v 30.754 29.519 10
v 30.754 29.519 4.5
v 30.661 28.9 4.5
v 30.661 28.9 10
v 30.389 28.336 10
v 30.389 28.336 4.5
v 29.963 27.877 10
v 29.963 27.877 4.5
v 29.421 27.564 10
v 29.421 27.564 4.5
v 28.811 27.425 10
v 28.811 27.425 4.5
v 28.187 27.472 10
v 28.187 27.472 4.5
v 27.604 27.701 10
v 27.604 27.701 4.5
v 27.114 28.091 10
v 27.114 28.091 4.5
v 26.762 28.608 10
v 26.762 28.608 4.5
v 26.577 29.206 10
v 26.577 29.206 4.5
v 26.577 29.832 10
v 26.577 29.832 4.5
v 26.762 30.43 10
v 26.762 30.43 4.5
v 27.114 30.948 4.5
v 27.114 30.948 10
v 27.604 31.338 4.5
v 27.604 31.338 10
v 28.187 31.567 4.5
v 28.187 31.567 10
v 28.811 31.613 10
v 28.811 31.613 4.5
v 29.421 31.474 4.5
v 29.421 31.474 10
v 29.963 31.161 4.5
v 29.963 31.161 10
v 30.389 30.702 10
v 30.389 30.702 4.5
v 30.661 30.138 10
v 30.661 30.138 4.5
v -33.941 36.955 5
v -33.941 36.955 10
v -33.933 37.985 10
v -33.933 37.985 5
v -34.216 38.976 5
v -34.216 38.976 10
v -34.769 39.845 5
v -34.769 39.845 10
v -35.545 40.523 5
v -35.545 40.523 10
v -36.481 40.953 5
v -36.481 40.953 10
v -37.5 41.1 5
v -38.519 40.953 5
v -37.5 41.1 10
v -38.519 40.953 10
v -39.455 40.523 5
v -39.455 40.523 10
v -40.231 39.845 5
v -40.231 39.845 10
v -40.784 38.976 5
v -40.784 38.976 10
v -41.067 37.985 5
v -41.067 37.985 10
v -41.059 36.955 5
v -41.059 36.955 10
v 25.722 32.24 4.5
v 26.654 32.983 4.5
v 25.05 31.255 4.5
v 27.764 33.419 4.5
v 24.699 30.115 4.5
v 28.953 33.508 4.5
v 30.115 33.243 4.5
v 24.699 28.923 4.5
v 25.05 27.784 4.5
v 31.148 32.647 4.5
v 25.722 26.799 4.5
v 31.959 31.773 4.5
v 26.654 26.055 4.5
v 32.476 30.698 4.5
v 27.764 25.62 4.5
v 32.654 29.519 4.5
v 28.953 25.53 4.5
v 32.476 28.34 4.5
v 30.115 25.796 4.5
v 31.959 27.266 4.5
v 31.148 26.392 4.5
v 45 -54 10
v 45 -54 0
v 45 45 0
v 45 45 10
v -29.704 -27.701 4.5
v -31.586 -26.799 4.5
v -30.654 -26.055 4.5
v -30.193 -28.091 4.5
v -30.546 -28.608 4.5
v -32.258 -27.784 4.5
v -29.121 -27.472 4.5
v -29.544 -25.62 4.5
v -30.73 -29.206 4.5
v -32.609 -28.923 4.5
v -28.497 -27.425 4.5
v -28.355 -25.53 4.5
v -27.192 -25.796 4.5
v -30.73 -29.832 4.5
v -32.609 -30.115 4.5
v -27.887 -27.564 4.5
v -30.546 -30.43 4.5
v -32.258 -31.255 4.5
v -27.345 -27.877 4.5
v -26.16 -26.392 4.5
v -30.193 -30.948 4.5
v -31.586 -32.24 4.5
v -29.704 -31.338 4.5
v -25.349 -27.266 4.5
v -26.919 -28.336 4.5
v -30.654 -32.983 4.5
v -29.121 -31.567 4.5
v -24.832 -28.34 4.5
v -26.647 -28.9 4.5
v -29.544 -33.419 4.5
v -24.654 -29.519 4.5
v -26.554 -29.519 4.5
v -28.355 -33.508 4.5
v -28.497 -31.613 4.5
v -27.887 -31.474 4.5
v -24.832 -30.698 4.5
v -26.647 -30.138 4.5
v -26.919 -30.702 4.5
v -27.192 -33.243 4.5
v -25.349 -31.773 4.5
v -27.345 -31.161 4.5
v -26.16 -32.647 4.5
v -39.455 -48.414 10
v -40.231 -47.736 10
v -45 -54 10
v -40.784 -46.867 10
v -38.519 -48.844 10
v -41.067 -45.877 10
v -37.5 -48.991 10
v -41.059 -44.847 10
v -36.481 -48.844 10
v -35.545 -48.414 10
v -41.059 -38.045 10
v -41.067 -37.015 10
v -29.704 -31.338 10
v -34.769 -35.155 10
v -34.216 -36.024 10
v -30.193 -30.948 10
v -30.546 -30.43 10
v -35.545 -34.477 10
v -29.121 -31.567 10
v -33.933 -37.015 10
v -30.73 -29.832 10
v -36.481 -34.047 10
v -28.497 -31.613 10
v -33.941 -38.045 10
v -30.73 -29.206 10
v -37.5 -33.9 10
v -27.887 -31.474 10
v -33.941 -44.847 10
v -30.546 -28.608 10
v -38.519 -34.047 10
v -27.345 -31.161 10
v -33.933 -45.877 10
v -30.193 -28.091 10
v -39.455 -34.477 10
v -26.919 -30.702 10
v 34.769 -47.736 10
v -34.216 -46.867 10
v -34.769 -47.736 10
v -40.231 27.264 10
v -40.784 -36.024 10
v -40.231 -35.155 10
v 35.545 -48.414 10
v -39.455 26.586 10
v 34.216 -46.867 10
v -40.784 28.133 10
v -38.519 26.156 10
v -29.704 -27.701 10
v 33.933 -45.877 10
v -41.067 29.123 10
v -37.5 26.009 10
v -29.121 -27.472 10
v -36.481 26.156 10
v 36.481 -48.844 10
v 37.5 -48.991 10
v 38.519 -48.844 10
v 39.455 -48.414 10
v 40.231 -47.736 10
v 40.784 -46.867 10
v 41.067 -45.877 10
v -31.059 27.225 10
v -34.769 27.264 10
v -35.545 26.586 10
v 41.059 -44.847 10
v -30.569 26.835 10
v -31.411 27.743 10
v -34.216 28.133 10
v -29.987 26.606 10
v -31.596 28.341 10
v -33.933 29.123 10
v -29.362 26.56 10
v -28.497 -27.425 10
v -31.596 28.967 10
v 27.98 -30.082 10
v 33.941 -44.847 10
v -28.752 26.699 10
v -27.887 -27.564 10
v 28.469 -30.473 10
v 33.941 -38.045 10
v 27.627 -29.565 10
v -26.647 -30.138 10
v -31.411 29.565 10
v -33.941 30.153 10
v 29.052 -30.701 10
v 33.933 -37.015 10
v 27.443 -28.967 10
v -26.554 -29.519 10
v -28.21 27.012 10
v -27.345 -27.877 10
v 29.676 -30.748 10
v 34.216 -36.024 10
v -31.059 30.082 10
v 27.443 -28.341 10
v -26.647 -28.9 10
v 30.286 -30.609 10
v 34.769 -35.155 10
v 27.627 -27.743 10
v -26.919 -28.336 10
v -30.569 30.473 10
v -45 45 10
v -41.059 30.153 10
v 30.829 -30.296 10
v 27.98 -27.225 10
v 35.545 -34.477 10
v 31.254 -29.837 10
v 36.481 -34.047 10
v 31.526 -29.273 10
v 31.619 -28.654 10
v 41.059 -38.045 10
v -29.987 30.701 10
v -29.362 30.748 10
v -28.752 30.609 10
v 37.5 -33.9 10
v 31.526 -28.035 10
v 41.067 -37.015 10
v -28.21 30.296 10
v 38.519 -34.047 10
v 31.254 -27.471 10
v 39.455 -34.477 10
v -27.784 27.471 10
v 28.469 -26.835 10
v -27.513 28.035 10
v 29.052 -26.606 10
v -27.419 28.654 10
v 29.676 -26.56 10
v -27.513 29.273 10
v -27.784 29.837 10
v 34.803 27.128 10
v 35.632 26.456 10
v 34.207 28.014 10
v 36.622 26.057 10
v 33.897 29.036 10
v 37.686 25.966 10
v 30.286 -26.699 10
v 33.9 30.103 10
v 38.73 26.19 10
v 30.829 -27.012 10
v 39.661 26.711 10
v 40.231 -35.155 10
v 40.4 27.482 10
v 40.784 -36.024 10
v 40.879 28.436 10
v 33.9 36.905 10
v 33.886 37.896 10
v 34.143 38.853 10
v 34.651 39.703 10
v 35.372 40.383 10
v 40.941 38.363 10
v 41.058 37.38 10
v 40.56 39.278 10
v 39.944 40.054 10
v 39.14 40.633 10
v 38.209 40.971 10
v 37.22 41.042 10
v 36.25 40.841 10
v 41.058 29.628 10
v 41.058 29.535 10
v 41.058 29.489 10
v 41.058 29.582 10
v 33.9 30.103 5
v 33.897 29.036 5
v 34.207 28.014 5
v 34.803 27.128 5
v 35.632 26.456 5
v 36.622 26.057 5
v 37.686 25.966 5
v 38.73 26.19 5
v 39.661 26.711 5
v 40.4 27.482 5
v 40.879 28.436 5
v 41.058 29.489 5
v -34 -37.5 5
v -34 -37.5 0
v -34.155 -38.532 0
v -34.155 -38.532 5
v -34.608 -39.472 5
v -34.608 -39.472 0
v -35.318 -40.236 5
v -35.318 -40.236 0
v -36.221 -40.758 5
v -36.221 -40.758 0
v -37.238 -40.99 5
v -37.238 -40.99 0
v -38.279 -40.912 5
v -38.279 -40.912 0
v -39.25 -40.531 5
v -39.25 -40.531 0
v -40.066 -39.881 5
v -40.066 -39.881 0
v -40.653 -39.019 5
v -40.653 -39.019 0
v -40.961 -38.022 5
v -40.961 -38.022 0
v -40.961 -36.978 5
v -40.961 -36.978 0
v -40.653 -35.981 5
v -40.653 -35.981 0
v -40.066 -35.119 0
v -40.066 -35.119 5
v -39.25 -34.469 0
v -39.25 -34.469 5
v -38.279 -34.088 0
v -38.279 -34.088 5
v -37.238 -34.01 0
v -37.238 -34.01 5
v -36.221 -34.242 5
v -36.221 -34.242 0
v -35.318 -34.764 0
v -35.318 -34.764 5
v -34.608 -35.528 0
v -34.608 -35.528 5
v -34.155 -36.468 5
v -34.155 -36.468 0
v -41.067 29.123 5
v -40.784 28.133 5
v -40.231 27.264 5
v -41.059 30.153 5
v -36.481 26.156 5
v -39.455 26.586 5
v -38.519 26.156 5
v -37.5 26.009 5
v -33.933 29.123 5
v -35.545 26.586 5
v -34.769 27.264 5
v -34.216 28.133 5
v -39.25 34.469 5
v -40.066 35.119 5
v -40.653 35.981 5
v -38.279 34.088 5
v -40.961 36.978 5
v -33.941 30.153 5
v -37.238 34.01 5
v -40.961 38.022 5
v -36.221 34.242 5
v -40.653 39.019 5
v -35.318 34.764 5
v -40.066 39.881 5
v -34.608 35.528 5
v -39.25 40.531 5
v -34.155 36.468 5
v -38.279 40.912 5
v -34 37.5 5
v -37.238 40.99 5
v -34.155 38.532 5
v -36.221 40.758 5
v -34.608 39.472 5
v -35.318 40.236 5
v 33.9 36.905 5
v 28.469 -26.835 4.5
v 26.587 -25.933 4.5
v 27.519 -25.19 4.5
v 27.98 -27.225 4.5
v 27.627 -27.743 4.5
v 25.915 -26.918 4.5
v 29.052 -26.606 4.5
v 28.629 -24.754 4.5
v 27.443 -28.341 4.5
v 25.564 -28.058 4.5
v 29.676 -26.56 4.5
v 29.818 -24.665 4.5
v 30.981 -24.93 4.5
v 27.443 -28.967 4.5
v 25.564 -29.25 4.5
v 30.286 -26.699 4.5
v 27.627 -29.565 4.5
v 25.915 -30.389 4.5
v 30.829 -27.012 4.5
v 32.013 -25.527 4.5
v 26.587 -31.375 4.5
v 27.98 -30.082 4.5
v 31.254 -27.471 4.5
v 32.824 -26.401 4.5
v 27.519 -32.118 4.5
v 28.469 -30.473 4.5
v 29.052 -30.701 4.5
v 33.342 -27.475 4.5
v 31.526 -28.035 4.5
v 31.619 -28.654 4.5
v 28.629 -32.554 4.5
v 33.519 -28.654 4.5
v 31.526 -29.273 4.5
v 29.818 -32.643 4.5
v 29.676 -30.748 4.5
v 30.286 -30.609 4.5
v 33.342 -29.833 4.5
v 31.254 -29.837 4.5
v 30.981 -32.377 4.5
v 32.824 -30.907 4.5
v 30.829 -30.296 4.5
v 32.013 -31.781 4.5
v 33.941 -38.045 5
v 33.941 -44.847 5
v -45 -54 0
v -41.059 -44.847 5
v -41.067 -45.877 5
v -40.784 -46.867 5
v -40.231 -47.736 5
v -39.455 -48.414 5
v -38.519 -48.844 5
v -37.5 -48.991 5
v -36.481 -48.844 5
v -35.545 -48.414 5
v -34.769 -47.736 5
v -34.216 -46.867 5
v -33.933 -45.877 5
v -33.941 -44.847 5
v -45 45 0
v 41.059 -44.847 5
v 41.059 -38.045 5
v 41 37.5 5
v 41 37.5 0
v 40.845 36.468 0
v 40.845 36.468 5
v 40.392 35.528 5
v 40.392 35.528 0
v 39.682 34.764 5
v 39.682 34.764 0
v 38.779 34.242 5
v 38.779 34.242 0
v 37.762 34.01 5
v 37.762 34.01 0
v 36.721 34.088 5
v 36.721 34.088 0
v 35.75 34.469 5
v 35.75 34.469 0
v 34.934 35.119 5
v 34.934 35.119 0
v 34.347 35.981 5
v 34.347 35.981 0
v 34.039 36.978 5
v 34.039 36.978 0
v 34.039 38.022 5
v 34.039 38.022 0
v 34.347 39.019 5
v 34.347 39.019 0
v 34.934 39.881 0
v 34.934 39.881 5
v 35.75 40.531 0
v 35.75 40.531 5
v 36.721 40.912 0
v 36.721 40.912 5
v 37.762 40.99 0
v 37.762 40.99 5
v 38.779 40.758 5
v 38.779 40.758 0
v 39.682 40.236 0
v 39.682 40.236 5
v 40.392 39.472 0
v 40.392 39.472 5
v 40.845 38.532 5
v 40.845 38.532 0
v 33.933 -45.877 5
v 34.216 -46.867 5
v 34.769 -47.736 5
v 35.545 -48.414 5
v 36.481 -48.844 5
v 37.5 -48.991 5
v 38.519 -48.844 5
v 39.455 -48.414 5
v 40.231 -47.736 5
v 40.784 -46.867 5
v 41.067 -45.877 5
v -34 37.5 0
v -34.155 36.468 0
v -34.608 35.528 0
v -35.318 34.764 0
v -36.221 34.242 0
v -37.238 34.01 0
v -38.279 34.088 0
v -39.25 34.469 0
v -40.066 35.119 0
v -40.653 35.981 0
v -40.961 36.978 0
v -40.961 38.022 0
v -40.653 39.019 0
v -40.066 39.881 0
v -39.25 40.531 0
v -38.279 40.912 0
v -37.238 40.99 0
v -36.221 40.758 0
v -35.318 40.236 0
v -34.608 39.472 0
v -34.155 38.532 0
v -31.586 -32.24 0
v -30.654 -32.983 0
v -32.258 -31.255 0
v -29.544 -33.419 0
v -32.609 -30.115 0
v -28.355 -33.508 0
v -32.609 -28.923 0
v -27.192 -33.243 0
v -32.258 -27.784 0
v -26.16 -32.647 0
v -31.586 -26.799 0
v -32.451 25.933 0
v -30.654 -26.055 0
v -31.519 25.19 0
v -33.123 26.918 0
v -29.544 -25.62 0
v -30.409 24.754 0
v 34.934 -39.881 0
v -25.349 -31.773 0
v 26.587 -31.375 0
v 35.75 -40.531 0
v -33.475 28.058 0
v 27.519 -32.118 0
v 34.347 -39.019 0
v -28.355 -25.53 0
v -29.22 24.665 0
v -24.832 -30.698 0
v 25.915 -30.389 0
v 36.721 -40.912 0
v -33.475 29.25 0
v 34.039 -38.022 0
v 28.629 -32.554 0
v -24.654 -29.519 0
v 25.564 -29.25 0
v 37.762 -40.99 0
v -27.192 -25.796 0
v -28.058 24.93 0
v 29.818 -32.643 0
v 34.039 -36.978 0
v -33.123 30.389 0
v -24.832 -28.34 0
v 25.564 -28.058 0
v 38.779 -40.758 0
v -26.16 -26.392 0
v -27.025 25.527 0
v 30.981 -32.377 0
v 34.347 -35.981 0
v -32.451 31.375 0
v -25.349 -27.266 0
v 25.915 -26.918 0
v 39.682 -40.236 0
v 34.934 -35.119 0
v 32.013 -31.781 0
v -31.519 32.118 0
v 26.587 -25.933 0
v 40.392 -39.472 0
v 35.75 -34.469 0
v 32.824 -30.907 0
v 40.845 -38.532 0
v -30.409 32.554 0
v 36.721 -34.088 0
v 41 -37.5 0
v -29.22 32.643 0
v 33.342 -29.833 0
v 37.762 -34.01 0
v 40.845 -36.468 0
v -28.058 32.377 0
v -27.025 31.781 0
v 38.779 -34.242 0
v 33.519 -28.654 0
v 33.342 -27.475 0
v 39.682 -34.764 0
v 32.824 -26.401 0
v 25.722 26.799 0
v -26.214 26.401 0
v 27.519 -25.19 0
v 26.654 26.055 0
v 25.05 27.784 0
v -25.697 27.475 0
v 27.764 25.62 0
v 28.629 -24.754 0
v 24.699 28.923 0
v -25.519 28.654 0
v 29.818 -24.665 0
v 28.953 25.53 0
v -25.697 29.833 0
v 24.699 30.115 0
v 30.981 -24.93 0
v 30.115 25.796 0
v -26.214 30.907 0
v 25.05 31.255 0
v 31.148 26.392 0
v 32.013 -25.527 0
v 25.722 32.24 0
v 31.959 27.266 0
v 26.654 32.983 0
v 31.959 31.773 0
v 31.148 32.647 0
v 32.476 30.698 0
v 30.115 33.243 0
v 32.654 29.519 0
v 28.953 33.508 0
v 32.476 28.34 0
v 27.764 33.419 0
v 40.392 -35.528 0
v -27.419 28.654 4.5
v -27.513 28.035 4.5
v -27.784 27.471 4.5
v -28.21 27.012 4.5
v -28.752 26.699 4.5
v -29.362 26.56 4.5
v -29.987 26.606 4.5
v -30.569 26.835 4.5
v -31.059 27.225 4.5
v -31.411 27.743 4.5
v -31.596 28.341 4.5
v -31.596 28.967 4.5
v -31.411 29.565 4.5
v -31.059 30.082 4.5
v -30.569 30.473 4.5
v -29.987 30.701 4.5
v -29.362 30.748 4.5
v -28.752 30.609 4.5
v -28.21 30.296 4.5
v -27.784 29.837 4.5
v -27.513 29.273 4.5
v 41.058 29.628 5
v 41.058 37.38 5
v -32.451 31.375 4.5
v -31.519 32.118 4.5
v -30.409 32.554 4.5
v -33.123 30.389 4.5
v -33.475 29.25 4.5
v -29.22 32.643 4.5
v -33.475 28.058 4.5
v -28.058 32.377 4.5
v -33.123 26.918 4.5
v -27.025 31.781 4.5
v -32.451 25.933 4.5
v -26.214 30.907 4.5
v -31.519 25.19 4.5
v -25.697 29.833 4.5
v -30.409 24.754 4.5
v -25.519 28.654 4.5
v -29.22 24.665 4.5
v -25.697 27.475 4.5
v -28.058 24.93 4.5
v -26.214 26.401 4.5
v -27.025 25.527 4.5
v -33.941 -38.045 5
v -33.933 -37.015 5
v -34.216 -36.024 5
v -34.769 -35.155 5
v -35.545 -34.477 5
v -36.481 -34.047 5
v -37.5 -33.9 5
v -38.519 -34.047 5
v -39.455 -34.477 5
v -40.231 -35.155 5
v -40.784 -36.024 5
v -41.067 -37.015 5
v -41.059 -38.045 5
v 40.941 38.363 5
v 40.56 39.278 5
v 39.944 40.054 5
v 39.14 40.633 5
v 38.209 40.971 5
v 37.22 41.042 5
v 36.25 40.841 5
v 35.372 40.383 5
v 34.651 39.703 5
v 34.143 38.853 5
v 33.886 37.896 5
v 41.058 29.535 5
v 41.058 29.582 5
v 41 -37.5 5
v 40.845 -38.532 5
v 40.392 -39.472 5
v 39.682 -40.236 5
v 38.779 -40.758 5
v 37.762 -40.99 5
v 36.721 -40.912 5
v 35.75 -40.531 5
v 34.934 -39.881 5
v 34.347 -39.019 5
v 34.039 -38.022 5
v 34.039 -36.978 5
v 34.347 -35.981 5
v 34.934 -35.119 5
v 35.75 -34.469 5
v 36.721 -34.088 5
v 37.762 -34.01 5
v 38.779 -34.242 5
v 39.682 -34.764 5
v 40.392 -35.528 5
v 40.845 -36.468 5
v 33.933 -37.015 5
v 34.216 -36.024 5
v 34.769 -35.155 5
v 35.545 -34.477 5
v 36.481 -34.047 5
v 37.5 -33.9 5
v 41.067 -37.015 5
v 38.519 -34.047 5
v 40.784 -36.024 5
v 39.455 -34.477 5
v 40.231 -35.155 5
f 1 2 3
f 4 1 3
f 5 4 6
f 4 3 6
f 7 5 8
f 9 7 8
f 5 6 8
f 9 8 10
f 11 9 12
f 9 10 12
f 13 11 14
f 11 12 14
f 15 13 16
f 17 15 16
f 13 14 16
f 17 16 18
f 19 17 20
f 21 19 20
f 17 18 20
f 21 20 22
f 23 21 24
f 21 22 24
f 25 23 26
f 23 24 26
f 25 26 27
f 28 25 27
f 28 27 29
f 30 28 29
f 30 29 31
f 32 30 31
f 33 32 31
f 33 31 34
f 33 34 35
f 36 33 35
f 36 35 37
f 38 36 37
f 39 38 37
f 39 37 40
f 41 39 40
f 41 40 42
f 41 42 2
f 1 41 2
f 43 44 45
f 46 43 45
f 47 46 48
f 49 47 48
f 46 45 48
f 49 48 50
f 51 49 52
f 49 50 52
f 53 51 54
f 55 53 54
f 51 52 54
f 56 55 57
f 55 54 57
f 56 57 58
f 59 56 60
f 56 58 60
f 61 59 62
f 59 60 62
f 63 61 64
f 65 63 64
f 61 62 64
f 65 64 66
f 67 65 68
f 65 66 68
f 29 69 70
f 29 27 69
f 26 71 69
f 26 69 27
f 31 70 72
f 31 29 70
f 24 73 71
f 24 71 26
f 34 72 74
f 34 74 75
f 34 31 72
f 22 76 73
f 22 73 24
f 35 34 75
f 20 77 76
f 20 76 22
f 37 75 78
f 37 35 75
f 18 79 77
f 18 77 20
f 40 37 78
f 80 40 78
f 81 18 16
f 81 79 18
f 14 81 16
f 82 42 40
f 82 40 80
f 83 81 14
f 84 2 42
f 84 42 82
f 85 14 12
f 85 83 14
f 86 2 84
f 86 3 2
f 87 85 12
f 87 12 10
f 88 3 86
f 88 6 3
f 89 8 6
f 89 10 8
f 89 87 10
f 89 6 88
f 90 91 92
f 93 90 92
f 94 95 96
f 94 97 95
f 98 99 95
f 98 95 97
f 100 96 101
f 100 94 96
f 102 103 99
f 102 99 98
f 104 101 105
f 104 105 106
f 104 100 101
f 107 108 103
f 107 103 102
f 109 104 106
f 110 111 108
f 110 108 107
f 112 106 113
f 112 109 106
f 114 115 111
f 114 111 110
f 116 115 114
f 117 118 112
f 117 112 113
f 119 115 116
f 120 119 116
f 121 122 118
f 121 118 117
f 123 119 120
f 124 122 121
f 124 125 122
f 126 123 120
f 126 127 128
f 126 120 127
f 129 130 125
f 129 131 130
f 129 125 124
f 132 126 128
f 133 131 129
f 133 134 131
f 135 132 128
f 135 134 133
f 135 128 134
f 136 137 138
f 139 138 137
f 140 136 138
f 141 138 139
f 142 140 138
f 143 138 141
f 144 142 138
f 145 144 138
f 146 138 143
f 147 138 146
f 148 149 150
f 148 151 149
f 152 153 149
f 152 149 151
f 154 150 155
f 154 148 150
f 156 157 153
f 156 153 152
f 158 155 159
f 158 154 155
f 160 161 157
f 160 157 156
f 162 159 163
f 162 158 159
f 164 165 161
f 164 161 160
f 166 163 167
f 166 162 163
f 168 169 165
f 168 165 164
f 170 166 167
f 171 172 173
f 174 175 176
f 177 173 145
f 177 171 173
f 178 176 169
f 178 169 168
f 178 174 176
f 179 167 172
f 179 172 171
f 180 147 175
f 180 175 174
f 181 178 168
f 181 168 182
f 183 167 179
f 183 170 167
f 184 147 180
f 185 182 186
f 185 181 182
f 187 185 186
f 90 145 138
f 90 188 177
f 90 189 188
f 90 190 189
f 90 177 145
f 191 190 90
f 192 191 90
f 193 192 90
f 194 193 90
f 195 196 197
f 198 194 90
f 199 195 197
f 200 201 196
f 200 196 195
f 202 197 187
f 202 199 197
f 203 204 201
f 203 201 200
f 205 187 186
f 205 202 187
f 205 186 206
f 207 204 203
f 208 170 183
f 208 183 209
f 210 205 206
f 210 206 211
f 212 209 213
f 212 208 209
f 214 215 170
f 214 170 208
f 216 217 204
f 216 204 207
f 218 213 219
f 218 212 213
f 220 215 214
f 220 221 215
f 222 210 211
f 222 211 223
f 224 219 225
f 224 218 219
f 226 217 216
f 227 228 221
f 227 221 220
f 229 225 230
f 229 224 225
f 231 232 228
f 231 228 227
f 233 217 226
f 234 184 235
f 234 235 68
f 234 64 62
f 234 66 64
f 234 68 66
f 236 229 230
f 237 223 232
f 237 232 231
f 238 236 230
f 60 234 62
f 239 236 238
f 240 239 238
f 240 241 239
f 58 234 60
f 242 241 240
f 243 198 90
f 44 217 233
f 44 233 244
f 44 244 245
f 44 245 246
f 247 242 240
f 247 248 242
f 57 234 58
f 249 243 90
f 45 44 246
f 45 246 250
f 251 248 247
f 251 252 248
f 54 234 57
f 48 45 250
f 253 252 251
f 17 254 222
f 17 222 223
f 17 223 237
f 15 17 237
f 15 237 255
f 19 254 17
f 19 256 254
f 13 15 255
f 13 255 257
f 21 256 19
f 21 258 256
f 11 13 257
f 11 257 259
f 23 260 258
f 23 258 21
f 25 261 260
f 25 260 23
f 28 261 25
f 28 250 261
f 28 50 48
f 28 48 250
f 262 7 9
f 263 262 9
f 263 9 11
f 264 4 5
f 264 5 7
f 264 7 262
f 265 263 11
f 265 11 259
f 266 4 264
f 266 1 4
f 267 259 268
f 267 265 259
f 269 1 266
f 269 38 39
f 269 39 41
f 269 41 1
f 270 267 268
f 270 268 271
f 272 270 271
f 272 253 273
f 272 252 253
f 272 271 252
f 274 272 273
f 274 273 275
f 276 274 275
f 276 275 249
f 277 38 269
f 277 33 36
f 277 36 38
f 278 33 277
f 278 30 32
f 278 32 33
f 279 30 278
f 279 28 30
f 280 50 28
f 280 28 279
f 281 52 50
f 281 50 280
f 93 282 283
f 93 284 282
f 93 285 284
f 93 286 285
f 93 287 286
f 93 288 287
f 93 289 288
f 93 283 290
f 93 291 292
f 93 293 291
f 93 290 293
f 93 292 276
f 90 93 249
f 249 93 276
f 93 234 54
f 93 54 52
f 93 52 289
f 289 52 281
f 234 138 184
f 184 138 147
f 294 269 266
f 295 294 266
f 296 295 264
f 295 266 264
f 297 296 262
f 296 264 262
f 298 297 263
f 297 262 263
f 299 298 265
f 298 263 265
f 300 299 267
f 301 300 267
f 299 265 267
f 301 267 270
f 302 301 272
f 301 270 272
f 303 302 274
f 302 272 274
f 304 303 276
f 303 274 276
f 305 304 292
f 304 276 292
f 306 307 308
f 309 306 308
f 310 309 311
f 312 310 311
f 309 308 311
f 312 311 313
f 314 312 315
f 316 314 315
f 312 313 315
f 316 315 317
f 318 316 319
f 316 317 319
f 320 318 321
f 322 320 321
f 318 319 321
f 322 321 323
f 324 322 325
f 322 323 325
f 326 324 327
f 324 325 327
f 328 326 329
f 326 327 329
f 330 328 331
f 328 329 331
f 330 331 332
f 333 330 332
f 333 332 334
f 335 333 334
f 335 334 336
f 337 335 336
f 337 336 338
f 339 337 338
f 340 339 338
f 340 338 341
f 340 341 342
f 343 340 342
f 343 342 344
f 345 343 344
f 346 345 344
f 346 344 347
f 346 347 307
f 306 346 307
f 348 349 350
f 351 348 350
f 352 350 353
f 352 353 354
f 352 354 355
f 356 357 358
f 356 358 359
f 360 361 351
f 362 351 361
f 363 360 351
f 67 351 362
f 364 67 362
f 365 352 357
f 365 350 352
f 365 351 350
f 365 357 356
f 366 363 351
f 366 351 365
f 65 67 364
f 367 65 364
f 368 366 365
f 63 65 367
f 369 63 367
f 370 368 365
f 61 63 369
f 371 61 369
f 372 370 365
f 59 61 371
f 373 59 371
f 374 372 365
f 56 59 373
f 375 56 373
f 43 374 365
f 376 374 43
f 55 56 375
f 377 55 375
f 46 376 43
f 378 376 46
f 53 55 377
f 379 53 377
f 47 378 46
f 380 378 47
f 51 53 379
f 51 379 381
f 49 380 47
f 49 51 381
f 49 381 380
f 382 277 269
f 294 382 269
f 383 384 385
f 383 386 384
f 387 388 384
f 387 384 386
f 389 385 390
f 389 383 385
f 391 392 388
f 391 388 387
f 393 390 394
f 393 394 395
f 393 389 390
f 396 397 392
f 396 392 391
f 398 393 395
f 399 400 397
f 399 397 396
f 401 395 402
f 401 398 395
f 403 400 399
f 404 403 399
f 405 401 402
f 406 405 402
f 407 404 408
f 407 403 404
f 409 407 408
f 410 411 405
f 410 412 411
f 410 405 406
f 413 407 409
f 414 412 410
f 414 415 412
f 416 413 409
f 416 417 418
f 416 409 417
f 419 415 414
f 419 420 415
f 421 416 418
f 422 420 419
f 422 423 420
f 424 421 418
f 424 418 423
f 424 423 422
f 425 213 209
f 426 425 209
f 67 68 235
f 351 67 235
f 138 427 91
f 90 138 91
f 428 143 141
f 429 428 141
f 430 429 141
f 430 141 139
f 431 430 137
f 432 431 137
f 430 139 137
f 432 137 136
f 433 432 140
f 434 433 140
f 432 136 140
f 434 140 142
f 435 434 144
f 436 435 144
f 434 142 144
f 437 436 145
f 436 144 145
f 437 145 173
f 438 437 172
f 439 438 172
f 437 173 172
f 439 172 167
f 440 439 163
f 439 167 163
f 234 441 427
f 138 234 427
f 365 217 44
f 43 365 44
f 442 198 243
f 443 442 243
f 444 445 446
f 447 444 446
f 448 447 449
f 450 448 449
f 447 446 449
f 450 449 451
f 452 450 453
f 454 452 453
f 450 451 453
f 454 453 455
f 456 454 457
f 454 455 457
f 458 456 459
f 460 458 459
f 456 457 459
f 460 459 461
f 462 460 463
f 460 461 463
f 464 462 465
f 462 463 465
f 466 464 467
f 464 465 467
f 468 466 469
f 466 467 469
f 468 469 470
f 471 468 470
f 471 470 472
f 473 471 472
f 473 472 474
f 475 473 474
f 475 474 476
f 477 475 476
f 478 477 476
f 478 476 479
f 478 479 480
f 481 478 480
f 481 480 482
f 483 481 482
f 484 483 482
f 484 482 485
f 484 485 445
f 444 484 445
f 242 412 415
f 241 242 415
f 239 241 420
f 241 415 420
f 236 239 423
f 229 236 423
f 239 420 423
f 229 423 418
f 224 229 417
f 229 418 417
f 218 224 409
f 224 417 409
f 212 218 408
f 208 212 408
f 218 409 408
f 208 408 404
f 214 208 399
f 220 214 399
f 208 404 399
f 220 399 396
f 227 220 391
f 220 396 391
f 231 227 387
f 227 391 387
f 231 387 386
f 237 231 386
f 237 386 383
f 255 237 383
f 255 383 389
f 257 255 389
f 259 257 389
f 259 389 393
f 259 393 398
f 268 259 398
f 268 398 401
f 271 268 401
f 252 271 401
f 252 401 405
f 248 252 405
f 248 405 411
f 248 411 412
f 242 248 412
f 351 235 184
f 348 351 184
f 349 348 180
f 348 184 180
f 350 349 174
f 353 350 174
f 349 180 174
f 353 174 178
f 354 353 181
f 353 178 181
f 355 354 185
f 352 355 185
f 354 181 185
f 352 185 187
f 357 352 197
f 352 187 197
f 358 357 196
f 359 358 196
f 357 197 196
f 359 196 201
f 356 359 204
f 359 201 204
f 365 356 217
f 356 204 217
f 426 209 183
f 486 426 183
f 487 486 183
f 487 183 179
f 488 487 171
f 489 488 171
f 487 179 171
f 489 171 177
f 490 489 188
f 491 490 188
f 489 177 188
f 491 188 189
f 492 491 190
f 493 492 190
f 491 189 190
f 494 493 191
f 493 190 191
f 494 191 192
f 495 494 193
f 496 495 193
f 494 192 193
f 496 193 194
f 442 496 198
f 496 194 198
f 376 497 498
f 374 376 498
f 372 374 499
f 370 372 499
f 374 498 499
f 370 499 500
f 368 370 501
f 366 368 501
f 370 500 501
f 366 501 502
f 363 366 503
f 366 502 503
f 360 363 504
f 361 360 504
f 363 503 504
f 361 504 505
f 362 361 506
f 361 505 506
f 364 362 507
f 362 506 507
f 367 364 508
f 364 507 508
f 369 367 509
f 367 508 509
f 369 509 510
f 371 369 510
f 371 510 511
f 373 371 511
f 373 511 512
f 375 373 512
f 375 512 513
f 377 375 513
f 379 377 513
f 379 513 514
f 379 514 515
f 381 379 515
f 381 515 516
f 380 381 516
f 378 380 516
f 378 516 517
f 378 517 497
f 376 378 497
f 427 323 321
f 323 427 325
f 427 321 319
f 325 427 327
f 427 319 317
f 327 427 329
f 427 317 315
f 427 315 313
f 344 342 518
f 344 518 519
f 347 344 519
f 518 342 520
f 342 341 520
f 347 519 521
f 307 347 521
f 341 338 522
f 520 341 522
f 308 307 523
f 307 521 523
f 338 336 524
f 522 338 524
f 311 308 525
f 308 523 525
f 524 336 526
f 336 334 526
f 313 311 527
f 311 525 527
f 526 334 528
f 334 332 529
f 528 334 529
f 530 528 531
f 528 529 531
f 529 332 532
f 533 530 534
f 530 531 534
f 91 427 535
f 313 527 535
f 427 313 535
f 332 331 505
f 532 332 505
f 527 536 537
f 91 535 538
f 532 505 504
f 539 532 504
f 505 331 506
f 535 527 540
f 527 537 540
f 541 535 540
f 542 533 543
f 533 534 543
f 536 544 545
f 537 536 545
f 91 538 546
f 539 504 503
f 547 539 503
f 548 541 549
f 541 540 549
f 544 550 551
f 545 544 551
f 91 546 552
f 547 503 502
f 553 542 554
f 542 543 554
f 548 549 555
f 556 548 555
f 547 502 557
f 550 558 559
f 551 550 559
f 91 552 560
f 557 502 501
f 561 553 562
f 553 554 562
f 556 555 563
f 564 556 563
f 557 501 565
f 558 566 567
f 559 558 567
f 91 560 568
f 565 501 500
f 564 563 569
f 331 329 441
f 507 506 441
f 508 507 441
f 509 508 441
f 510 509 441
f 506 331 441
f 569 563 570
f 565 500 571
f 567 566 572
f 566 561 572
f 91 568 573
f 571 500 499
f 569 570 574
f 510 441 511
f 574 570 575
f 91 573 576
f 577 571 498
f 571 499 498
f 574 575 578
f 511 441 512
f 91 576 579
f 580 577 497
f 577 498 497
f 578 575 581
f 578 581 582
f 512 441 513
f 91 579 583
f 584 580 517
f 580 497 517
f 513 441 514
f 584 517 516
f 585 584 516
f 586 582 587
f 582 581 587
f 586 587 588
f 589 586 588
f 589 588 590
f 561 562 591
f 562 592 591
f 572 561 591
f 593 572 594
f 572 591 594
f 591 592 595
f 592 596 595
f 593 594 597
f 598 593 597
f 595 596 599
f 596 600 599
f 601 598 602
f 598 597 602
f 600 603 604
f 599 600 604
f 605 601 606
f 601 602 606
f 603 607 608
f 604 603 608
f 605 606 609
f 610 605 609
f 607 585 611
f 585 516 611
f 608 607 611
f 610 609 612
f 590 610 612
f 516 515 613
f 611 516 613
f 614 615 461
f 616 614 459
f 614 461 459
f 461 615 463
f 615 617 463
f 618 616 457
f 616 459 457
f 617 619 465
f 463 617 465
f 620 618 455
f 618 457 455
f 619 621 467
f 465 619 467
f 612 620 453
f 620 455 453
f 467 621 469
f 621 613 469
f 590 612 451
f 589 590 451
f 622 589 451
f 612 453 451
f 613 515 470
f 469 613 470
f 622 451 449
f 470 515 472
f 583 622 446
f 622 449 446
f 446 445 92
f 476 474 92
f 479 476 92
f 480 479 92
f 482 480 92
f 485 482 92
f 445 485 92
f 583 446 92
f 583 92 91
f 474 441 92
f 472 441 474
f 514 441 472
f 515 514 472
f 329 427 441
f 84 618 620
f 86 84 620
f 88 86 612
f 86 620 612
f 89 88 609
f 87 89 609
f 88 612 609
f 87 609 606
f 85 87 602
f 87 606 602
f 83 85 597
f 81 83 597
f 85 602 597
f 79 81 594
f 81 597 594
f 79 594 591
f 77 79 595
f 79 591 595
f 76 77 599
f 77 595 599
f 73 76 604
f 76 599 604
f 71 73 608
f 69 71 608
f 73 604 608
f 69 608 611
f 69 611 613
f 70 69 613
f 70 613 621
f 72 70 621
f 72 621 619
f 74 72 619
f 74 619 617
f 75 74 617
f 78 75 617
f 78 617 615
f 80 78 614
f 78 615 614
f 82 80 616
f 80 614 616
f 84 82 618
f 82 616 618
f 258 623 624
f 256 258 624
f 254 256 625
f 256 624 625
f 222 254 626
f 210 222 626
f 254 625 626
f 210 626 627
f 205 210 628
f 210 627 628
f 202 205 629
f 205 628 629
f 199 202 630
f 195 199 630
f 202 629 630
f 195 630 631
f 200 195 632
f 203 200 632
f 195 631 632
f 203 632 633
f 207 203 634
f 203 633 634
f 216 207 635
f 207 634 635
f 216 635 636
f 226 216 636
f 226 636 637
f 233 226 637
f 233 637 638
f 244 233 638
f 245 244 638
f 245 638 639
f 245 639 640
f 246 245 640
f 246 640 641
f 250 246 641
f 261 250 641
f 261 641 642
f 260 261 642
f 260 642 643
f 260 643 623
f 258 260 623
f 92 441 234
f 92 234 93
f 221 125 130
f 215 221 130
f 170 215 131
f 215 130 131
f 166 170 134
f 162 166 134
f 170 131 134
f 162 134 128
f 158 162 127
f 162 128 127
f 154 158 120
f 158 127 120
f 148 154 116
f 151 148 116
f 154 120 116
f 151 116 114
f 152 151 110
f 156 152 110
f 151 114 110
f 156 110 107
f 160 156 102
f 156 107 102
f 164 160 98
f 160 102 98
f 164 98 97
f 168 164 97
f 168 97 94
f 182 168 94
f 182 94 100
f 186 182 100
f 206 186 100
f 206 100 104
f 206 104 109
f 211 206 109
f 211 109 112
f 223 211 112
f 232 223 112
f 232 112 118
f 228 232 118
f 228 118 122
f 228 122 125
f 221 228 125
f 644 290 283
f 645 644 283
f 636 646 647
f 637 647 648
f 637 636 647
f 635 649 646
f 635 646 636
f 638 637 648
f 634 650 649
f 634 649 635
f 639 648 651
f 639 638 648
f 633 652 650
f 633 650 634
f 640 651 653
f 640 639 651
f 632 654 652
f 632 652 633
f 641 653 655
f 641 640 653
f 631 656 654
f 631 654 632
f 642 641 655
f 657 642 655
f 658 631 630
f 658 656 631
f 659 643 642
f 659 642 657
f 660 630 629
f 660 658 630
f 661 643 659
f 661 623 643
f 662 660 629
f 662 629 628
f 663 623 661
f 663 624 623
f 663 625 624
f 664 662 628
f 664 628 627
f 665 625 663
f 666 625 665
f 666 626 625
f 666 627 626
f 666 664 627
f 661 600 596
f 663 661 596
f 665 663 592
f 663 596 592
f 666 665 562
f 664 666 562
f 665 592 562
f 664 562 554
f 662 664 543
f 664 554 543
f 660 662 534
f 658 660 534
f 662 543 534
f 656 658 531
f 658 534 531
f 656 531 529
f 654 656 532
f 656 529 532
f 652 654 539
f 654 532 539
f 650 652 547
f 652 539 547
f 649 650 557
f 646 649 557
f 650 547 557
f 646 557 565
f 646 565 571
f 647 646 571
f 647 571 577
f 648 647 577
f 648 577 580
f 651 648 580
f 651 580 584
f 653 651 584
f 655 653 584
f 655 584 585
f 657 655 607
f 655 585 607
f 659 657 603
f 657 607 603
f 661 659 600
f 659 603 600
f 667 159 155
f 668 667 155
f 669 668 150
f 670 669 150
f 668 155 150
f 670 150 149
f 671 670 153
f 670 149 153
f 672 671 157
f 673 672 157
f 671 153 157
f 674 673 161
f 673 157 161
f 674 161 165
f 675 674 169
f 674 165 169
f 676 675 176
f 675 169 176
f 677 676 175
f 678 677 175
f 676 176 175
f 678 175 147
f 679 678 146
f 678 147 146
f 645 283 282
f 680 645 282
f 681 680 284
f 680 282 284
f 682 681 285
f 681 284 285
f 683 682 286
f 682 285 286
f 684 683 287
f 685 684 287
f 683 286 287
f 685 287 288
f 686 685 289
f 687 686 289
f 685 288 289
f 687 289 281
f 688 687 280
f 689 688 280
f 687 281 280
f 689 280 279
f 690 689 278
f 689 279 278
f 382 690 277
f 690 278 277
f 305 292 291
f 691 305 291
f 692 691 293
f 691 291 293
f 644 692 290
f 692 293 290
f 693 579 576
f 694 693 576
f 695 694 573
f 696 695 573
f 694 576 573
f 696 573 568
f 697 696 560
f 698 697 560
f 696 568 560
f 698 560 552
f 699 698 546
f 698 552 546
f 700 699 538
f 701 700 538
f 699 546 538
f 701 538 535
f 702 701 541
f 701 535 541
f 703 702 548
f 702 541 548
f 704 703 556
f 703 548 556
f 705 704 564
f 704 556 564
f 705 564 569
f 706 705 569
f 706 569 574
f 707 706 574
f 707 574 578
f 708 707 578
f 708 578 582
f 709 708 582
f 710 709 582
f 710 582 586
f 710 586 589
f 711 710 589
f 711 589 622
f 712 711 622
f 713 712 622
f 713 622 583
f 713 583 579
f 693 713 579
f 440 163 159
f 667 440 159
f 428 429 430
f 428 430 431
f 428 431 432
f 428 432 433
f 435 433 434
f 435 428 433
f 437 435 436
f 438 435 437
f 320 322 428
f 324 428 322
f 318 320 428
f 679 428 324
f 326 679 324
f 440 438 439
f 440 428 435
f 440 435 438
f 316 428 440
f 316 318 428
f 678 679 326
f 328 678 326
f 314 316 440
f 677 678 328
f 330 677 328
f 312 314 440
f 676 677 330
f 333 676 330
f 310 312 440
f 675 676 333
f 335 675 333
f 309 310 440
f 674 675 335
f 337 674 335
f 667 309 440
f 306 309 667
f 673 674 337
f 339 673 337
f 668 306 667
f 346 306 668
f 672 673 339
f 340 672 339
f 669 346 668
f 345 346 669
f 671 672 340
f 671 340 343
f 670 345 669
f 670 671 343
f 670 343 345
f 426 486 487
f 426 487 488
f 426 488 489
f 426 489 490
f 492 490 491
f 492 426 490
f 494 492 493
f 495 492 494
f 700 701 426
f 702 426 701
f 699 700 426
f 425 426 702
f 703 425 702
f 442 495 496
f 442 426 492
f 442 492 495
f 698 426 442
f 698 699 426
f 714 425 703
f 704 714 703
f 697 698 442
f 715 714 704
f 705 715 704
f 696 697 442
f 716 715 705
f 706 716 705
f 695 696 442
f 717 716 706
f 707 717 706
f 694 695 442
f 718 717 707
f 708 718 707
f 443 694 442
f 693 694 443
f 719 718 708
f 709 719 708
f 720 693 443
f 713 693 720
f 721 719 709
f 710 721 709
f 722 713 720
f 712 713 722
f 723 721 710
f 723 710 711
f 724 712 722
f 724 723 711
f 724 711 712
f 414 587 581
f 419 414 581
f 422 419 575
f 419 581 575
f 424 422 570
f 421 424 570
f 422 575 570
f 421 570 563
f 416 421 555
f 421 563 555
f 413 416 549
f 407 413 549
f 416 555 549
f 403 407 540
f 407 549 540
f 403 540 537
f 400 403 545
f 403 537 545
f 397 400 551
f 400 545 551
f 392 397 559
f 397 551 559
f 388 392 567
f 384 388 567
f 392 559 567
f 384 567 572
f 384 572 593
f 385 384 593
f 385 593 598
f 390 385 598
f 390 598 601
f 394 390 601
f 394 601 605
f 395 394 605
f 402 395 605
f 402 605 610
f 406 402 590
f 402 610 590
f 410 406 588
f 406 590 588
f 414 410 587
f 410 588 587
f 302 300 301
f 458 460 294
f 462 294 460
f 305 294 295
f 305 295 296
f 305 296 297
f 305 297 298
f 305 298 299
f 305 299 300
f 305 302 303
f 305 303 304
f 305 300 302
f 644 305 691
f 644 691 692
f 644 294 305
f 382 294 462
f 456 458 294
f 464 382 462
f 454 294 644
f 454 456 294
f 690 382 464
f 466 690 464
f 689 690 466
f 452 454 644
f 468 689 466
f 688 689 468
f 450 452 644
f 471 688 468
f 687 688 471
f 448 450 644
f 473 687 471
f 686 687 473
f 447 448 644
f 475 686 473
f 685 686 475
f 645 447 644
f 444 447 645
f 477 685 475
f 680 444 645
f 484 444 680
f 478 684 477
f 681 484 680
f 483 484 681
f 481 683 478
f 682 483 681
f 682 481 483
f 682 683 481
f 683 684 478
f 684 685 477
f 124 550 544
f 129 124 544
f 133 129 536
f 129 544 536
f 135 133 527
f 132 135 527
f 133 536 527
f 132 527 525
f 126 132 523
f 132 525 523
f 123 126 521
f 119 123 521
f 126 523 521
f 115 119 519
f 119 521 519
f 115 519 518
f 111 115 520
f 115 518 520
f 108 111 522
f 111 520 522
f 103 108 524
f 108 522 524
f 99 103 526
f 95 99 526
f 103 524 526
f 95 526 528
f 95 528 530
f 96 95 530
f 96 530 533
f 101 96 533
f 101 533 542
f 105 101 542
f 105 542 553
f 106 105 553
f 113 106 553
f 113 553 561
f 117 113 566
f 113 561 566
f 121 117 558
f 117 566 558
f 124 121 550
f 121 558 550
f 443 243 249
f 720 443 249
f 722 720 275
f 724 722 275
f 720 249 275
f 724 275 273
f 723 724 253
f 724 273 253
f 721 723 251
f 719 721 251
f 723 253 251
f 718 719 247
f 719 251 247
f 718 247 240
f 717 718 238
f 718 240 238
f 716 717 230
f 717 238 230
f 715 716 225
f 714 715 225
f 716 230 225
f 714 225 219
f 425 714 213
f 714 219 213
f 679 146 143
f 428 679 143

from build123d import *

# Parameters (mm, degrees)
F0_W     = 90
F0_H     = 9
F0_H_2   = 90
F0_R     = 2.5
F1_DEPTH = 10
F3_DEPTH = 5
F4_R     = 3.5
F4_R_2   = 2.5
F5_DEPTH = 25
F6_R     = 4
F6_R_2   = 2.1
F7_DEPTH = 4.5
F8_DEPTH = 25


with BuildPart() as f1:
    # F0 (on Top) → F1 (new body)
    with BuildSketch(Plane.XY):
        with Locations((0, -49.5)):
            Rectangle(F0_W, F0_H)
        Rectangle(F0_W, F0_H_2)
        with Locations((-37.5, -37.5)):
            Circle(F0_R, mode=Mode.SUBTRACT)
        with Locations((37.5, -37.5)):
            Circle(F0_R, mode=Mode.SUBTRACT)
        with Locations((-37.5, 37.5)):
            Circle(F0_R, mode=Mode.SUBTRACT)
        with Locations((37.5, 37.5)):
            Circle(F0_R, mode=Mode.SUBTRACT)
    extrude(amount=F1_DEPTH)

    # F2 (on face) → F3 (cut)
    with BuildSketch(Plane.XY.offset(10)):
        with BuildLine():
            Line((-33.9414238613, 30.1534489324), (-33.9414238613, 36.9554489324))
            ThreePointArc((-33.9414238613, 36.9554489324), (-37.5000142062, 41.1), (-41.0585718408, 36.9554208469))
            Line((-41.0585718408, 36.9554208469), (-41.0585718408, 30.153477018))
            ThreePointArc((-41.0585718408, 30.153477018), (-37.5000142062, 26.0088978648), (-33.9414238613, 30.1534489324))
        make_face()
        with BuildLine():
            Line((41.0578852383, 29.6284612117), (41.0578852383, 37.3796984459))
            ThreePointArc((41.0578852383, 37.3796984459), (37.2203682179, 41.0417420458), (33.8999927044, 36.9050517432))
            Line((33.8999927044, 36.9050517432), (33.8999927044, 30.1031079143))
            ThreePointArc((33.8999927044, 30.1031079143), (37.1506339605, 25.9717225558), (41.0578852383, 29.4885963107))
            Line((41.0578852383, 29.4885963107), (41.0578852383, 29.6284612117))
        make_face()
        with BuildLine():
            ThreePointArc((41.0578852383, 29.4885963107), (41.0585645452, 29.5585287612), (41.0578852383, 29.6284612117))
            Line((41.0578852383, 29.6284612117), (41.0578852383, 29.4885963107))
        make_face()
        with BuildLine():
            Line((-33.9414238613, -44.8465510676), (-33.9414238613, -38.0445510676))
            ThreePointArc((-33.9414238613, -38.0445510676), (-37.5000142062, -33.9), (-41.0585718408, -38.0445791531))
            Line((-41.0585718408, -38.0445791531), (-41.0585718408, -44.846522982))
            ThreePointArc((-41.0585718408, -44.846522982), (-37.5000142062, -48.9911021352), (-33.9414238613, -44.8465510676))
        make_face()
        with BuildLine():
            Line((41.0585761387, -44.8465510676), (41.0585761387, -38.0445510676))
            ThreePointArc((41.0585761387, -38.0445510676), (37.4999857938, -33.9), (33.9414281592, -38.0445791531))
            Line((33.9414281592, -38.0445791531), (33.9414281592, -44.846522982))
            ThreePointArc((33.9414281592, -44.846522982), (37.4999857938, -48.9911021352), (41.0585761387, -44.8465510676))
        make_face()
    extrude(amount=-F3_DEPTH, mode=Mode.SUBTRACT)

    # F4 (on face) → F5 (cut)
    with BuildSketch(Plane(origin=(0, 0, 0), x_dir=(1, 0, 0), z_dir=(0, 0, -1))):
        with Locations((-37.5, -37.5)):
            Circle(F4_R)
        with Locations((-37.5, -37.5)):
            Circle(F4_R_2, mode=Mode.SUBTRACT)
        with Locations((-37.5, 37.5)):
            Circle(F4_R)
        with Locations((-37.5, 37.5)):
            Circle(F4_R_2, mode=Mode.SUBTRACT)
        with Locations((37.5, 37.5)):
            Circle(F4_R)
        with Locations((37.5, 37.5)):
            Circle(F4_R_2, mode=Mode.SUBTRACT)
        with Locations((37.5, -37.5)):
            Circle(F4_R)
        with Locations((37.5, -37.5)):
            Circle(F4_R_2, mode=Mode.SUBTRACT)
    extrude(amount=-F5_DEPTH, mode=Mode.SUBTRACT)

    # F6 (on face) → F7 (cut)
    with BuildSketch(Plane(origin=(0, 0, 0), x_dir=(1, 0, 0), z_dir=(0, 0, -1))):
        with Locations((-29.51923199, -28.6538470536)):
            Circle(F6_R)
        with Locations((-29.51923199, -28.6538470536)):
            Circle(F6_R_2, mode=Mode.SUBTRACT)
        with Locations((28.6538470536, -29.51923199)):
            Circle(F6_R)
        with Locations((28.6538470536, -29.51923199)):
            Circle(F6_R_2, mode=Mode.SUBTRACT)
        with Locations((-28.6538470536, 29.51923199)):
            Circle(F6_R)
        with Locations((-28.6538470536, 29.51923199)):
            Circle(F6_R_2, mode=Mode.SUBTRACT)
        with Locations((29.51923199, 28.6538470536)):
            Circle(F6_R)
        with Locations((29.51923199, 28.6538470536)):
            Circle(F6_R_2, mode=Mode.SUBTRACT)
    extrude(amount=-F7_DEPTH, mode=Mode.SUBTRACT)

    # F8 (cut): faces of the model
    f8_faces = [f1.faces().sort_by_distance(p)[0] for p in [
        (-28.6538470536, -29.51923199, 0),
        (29.51923199, -28.6538470536, 0),
        (28.6538470536, 29.51923199, 0),
        (-29.51923199, 28.6538470536, 0),
    ]]
    extrude(f8_faces, amount=-F8_DEPTH, mode=Mode.SUBTRACT)


solid = f1.part
